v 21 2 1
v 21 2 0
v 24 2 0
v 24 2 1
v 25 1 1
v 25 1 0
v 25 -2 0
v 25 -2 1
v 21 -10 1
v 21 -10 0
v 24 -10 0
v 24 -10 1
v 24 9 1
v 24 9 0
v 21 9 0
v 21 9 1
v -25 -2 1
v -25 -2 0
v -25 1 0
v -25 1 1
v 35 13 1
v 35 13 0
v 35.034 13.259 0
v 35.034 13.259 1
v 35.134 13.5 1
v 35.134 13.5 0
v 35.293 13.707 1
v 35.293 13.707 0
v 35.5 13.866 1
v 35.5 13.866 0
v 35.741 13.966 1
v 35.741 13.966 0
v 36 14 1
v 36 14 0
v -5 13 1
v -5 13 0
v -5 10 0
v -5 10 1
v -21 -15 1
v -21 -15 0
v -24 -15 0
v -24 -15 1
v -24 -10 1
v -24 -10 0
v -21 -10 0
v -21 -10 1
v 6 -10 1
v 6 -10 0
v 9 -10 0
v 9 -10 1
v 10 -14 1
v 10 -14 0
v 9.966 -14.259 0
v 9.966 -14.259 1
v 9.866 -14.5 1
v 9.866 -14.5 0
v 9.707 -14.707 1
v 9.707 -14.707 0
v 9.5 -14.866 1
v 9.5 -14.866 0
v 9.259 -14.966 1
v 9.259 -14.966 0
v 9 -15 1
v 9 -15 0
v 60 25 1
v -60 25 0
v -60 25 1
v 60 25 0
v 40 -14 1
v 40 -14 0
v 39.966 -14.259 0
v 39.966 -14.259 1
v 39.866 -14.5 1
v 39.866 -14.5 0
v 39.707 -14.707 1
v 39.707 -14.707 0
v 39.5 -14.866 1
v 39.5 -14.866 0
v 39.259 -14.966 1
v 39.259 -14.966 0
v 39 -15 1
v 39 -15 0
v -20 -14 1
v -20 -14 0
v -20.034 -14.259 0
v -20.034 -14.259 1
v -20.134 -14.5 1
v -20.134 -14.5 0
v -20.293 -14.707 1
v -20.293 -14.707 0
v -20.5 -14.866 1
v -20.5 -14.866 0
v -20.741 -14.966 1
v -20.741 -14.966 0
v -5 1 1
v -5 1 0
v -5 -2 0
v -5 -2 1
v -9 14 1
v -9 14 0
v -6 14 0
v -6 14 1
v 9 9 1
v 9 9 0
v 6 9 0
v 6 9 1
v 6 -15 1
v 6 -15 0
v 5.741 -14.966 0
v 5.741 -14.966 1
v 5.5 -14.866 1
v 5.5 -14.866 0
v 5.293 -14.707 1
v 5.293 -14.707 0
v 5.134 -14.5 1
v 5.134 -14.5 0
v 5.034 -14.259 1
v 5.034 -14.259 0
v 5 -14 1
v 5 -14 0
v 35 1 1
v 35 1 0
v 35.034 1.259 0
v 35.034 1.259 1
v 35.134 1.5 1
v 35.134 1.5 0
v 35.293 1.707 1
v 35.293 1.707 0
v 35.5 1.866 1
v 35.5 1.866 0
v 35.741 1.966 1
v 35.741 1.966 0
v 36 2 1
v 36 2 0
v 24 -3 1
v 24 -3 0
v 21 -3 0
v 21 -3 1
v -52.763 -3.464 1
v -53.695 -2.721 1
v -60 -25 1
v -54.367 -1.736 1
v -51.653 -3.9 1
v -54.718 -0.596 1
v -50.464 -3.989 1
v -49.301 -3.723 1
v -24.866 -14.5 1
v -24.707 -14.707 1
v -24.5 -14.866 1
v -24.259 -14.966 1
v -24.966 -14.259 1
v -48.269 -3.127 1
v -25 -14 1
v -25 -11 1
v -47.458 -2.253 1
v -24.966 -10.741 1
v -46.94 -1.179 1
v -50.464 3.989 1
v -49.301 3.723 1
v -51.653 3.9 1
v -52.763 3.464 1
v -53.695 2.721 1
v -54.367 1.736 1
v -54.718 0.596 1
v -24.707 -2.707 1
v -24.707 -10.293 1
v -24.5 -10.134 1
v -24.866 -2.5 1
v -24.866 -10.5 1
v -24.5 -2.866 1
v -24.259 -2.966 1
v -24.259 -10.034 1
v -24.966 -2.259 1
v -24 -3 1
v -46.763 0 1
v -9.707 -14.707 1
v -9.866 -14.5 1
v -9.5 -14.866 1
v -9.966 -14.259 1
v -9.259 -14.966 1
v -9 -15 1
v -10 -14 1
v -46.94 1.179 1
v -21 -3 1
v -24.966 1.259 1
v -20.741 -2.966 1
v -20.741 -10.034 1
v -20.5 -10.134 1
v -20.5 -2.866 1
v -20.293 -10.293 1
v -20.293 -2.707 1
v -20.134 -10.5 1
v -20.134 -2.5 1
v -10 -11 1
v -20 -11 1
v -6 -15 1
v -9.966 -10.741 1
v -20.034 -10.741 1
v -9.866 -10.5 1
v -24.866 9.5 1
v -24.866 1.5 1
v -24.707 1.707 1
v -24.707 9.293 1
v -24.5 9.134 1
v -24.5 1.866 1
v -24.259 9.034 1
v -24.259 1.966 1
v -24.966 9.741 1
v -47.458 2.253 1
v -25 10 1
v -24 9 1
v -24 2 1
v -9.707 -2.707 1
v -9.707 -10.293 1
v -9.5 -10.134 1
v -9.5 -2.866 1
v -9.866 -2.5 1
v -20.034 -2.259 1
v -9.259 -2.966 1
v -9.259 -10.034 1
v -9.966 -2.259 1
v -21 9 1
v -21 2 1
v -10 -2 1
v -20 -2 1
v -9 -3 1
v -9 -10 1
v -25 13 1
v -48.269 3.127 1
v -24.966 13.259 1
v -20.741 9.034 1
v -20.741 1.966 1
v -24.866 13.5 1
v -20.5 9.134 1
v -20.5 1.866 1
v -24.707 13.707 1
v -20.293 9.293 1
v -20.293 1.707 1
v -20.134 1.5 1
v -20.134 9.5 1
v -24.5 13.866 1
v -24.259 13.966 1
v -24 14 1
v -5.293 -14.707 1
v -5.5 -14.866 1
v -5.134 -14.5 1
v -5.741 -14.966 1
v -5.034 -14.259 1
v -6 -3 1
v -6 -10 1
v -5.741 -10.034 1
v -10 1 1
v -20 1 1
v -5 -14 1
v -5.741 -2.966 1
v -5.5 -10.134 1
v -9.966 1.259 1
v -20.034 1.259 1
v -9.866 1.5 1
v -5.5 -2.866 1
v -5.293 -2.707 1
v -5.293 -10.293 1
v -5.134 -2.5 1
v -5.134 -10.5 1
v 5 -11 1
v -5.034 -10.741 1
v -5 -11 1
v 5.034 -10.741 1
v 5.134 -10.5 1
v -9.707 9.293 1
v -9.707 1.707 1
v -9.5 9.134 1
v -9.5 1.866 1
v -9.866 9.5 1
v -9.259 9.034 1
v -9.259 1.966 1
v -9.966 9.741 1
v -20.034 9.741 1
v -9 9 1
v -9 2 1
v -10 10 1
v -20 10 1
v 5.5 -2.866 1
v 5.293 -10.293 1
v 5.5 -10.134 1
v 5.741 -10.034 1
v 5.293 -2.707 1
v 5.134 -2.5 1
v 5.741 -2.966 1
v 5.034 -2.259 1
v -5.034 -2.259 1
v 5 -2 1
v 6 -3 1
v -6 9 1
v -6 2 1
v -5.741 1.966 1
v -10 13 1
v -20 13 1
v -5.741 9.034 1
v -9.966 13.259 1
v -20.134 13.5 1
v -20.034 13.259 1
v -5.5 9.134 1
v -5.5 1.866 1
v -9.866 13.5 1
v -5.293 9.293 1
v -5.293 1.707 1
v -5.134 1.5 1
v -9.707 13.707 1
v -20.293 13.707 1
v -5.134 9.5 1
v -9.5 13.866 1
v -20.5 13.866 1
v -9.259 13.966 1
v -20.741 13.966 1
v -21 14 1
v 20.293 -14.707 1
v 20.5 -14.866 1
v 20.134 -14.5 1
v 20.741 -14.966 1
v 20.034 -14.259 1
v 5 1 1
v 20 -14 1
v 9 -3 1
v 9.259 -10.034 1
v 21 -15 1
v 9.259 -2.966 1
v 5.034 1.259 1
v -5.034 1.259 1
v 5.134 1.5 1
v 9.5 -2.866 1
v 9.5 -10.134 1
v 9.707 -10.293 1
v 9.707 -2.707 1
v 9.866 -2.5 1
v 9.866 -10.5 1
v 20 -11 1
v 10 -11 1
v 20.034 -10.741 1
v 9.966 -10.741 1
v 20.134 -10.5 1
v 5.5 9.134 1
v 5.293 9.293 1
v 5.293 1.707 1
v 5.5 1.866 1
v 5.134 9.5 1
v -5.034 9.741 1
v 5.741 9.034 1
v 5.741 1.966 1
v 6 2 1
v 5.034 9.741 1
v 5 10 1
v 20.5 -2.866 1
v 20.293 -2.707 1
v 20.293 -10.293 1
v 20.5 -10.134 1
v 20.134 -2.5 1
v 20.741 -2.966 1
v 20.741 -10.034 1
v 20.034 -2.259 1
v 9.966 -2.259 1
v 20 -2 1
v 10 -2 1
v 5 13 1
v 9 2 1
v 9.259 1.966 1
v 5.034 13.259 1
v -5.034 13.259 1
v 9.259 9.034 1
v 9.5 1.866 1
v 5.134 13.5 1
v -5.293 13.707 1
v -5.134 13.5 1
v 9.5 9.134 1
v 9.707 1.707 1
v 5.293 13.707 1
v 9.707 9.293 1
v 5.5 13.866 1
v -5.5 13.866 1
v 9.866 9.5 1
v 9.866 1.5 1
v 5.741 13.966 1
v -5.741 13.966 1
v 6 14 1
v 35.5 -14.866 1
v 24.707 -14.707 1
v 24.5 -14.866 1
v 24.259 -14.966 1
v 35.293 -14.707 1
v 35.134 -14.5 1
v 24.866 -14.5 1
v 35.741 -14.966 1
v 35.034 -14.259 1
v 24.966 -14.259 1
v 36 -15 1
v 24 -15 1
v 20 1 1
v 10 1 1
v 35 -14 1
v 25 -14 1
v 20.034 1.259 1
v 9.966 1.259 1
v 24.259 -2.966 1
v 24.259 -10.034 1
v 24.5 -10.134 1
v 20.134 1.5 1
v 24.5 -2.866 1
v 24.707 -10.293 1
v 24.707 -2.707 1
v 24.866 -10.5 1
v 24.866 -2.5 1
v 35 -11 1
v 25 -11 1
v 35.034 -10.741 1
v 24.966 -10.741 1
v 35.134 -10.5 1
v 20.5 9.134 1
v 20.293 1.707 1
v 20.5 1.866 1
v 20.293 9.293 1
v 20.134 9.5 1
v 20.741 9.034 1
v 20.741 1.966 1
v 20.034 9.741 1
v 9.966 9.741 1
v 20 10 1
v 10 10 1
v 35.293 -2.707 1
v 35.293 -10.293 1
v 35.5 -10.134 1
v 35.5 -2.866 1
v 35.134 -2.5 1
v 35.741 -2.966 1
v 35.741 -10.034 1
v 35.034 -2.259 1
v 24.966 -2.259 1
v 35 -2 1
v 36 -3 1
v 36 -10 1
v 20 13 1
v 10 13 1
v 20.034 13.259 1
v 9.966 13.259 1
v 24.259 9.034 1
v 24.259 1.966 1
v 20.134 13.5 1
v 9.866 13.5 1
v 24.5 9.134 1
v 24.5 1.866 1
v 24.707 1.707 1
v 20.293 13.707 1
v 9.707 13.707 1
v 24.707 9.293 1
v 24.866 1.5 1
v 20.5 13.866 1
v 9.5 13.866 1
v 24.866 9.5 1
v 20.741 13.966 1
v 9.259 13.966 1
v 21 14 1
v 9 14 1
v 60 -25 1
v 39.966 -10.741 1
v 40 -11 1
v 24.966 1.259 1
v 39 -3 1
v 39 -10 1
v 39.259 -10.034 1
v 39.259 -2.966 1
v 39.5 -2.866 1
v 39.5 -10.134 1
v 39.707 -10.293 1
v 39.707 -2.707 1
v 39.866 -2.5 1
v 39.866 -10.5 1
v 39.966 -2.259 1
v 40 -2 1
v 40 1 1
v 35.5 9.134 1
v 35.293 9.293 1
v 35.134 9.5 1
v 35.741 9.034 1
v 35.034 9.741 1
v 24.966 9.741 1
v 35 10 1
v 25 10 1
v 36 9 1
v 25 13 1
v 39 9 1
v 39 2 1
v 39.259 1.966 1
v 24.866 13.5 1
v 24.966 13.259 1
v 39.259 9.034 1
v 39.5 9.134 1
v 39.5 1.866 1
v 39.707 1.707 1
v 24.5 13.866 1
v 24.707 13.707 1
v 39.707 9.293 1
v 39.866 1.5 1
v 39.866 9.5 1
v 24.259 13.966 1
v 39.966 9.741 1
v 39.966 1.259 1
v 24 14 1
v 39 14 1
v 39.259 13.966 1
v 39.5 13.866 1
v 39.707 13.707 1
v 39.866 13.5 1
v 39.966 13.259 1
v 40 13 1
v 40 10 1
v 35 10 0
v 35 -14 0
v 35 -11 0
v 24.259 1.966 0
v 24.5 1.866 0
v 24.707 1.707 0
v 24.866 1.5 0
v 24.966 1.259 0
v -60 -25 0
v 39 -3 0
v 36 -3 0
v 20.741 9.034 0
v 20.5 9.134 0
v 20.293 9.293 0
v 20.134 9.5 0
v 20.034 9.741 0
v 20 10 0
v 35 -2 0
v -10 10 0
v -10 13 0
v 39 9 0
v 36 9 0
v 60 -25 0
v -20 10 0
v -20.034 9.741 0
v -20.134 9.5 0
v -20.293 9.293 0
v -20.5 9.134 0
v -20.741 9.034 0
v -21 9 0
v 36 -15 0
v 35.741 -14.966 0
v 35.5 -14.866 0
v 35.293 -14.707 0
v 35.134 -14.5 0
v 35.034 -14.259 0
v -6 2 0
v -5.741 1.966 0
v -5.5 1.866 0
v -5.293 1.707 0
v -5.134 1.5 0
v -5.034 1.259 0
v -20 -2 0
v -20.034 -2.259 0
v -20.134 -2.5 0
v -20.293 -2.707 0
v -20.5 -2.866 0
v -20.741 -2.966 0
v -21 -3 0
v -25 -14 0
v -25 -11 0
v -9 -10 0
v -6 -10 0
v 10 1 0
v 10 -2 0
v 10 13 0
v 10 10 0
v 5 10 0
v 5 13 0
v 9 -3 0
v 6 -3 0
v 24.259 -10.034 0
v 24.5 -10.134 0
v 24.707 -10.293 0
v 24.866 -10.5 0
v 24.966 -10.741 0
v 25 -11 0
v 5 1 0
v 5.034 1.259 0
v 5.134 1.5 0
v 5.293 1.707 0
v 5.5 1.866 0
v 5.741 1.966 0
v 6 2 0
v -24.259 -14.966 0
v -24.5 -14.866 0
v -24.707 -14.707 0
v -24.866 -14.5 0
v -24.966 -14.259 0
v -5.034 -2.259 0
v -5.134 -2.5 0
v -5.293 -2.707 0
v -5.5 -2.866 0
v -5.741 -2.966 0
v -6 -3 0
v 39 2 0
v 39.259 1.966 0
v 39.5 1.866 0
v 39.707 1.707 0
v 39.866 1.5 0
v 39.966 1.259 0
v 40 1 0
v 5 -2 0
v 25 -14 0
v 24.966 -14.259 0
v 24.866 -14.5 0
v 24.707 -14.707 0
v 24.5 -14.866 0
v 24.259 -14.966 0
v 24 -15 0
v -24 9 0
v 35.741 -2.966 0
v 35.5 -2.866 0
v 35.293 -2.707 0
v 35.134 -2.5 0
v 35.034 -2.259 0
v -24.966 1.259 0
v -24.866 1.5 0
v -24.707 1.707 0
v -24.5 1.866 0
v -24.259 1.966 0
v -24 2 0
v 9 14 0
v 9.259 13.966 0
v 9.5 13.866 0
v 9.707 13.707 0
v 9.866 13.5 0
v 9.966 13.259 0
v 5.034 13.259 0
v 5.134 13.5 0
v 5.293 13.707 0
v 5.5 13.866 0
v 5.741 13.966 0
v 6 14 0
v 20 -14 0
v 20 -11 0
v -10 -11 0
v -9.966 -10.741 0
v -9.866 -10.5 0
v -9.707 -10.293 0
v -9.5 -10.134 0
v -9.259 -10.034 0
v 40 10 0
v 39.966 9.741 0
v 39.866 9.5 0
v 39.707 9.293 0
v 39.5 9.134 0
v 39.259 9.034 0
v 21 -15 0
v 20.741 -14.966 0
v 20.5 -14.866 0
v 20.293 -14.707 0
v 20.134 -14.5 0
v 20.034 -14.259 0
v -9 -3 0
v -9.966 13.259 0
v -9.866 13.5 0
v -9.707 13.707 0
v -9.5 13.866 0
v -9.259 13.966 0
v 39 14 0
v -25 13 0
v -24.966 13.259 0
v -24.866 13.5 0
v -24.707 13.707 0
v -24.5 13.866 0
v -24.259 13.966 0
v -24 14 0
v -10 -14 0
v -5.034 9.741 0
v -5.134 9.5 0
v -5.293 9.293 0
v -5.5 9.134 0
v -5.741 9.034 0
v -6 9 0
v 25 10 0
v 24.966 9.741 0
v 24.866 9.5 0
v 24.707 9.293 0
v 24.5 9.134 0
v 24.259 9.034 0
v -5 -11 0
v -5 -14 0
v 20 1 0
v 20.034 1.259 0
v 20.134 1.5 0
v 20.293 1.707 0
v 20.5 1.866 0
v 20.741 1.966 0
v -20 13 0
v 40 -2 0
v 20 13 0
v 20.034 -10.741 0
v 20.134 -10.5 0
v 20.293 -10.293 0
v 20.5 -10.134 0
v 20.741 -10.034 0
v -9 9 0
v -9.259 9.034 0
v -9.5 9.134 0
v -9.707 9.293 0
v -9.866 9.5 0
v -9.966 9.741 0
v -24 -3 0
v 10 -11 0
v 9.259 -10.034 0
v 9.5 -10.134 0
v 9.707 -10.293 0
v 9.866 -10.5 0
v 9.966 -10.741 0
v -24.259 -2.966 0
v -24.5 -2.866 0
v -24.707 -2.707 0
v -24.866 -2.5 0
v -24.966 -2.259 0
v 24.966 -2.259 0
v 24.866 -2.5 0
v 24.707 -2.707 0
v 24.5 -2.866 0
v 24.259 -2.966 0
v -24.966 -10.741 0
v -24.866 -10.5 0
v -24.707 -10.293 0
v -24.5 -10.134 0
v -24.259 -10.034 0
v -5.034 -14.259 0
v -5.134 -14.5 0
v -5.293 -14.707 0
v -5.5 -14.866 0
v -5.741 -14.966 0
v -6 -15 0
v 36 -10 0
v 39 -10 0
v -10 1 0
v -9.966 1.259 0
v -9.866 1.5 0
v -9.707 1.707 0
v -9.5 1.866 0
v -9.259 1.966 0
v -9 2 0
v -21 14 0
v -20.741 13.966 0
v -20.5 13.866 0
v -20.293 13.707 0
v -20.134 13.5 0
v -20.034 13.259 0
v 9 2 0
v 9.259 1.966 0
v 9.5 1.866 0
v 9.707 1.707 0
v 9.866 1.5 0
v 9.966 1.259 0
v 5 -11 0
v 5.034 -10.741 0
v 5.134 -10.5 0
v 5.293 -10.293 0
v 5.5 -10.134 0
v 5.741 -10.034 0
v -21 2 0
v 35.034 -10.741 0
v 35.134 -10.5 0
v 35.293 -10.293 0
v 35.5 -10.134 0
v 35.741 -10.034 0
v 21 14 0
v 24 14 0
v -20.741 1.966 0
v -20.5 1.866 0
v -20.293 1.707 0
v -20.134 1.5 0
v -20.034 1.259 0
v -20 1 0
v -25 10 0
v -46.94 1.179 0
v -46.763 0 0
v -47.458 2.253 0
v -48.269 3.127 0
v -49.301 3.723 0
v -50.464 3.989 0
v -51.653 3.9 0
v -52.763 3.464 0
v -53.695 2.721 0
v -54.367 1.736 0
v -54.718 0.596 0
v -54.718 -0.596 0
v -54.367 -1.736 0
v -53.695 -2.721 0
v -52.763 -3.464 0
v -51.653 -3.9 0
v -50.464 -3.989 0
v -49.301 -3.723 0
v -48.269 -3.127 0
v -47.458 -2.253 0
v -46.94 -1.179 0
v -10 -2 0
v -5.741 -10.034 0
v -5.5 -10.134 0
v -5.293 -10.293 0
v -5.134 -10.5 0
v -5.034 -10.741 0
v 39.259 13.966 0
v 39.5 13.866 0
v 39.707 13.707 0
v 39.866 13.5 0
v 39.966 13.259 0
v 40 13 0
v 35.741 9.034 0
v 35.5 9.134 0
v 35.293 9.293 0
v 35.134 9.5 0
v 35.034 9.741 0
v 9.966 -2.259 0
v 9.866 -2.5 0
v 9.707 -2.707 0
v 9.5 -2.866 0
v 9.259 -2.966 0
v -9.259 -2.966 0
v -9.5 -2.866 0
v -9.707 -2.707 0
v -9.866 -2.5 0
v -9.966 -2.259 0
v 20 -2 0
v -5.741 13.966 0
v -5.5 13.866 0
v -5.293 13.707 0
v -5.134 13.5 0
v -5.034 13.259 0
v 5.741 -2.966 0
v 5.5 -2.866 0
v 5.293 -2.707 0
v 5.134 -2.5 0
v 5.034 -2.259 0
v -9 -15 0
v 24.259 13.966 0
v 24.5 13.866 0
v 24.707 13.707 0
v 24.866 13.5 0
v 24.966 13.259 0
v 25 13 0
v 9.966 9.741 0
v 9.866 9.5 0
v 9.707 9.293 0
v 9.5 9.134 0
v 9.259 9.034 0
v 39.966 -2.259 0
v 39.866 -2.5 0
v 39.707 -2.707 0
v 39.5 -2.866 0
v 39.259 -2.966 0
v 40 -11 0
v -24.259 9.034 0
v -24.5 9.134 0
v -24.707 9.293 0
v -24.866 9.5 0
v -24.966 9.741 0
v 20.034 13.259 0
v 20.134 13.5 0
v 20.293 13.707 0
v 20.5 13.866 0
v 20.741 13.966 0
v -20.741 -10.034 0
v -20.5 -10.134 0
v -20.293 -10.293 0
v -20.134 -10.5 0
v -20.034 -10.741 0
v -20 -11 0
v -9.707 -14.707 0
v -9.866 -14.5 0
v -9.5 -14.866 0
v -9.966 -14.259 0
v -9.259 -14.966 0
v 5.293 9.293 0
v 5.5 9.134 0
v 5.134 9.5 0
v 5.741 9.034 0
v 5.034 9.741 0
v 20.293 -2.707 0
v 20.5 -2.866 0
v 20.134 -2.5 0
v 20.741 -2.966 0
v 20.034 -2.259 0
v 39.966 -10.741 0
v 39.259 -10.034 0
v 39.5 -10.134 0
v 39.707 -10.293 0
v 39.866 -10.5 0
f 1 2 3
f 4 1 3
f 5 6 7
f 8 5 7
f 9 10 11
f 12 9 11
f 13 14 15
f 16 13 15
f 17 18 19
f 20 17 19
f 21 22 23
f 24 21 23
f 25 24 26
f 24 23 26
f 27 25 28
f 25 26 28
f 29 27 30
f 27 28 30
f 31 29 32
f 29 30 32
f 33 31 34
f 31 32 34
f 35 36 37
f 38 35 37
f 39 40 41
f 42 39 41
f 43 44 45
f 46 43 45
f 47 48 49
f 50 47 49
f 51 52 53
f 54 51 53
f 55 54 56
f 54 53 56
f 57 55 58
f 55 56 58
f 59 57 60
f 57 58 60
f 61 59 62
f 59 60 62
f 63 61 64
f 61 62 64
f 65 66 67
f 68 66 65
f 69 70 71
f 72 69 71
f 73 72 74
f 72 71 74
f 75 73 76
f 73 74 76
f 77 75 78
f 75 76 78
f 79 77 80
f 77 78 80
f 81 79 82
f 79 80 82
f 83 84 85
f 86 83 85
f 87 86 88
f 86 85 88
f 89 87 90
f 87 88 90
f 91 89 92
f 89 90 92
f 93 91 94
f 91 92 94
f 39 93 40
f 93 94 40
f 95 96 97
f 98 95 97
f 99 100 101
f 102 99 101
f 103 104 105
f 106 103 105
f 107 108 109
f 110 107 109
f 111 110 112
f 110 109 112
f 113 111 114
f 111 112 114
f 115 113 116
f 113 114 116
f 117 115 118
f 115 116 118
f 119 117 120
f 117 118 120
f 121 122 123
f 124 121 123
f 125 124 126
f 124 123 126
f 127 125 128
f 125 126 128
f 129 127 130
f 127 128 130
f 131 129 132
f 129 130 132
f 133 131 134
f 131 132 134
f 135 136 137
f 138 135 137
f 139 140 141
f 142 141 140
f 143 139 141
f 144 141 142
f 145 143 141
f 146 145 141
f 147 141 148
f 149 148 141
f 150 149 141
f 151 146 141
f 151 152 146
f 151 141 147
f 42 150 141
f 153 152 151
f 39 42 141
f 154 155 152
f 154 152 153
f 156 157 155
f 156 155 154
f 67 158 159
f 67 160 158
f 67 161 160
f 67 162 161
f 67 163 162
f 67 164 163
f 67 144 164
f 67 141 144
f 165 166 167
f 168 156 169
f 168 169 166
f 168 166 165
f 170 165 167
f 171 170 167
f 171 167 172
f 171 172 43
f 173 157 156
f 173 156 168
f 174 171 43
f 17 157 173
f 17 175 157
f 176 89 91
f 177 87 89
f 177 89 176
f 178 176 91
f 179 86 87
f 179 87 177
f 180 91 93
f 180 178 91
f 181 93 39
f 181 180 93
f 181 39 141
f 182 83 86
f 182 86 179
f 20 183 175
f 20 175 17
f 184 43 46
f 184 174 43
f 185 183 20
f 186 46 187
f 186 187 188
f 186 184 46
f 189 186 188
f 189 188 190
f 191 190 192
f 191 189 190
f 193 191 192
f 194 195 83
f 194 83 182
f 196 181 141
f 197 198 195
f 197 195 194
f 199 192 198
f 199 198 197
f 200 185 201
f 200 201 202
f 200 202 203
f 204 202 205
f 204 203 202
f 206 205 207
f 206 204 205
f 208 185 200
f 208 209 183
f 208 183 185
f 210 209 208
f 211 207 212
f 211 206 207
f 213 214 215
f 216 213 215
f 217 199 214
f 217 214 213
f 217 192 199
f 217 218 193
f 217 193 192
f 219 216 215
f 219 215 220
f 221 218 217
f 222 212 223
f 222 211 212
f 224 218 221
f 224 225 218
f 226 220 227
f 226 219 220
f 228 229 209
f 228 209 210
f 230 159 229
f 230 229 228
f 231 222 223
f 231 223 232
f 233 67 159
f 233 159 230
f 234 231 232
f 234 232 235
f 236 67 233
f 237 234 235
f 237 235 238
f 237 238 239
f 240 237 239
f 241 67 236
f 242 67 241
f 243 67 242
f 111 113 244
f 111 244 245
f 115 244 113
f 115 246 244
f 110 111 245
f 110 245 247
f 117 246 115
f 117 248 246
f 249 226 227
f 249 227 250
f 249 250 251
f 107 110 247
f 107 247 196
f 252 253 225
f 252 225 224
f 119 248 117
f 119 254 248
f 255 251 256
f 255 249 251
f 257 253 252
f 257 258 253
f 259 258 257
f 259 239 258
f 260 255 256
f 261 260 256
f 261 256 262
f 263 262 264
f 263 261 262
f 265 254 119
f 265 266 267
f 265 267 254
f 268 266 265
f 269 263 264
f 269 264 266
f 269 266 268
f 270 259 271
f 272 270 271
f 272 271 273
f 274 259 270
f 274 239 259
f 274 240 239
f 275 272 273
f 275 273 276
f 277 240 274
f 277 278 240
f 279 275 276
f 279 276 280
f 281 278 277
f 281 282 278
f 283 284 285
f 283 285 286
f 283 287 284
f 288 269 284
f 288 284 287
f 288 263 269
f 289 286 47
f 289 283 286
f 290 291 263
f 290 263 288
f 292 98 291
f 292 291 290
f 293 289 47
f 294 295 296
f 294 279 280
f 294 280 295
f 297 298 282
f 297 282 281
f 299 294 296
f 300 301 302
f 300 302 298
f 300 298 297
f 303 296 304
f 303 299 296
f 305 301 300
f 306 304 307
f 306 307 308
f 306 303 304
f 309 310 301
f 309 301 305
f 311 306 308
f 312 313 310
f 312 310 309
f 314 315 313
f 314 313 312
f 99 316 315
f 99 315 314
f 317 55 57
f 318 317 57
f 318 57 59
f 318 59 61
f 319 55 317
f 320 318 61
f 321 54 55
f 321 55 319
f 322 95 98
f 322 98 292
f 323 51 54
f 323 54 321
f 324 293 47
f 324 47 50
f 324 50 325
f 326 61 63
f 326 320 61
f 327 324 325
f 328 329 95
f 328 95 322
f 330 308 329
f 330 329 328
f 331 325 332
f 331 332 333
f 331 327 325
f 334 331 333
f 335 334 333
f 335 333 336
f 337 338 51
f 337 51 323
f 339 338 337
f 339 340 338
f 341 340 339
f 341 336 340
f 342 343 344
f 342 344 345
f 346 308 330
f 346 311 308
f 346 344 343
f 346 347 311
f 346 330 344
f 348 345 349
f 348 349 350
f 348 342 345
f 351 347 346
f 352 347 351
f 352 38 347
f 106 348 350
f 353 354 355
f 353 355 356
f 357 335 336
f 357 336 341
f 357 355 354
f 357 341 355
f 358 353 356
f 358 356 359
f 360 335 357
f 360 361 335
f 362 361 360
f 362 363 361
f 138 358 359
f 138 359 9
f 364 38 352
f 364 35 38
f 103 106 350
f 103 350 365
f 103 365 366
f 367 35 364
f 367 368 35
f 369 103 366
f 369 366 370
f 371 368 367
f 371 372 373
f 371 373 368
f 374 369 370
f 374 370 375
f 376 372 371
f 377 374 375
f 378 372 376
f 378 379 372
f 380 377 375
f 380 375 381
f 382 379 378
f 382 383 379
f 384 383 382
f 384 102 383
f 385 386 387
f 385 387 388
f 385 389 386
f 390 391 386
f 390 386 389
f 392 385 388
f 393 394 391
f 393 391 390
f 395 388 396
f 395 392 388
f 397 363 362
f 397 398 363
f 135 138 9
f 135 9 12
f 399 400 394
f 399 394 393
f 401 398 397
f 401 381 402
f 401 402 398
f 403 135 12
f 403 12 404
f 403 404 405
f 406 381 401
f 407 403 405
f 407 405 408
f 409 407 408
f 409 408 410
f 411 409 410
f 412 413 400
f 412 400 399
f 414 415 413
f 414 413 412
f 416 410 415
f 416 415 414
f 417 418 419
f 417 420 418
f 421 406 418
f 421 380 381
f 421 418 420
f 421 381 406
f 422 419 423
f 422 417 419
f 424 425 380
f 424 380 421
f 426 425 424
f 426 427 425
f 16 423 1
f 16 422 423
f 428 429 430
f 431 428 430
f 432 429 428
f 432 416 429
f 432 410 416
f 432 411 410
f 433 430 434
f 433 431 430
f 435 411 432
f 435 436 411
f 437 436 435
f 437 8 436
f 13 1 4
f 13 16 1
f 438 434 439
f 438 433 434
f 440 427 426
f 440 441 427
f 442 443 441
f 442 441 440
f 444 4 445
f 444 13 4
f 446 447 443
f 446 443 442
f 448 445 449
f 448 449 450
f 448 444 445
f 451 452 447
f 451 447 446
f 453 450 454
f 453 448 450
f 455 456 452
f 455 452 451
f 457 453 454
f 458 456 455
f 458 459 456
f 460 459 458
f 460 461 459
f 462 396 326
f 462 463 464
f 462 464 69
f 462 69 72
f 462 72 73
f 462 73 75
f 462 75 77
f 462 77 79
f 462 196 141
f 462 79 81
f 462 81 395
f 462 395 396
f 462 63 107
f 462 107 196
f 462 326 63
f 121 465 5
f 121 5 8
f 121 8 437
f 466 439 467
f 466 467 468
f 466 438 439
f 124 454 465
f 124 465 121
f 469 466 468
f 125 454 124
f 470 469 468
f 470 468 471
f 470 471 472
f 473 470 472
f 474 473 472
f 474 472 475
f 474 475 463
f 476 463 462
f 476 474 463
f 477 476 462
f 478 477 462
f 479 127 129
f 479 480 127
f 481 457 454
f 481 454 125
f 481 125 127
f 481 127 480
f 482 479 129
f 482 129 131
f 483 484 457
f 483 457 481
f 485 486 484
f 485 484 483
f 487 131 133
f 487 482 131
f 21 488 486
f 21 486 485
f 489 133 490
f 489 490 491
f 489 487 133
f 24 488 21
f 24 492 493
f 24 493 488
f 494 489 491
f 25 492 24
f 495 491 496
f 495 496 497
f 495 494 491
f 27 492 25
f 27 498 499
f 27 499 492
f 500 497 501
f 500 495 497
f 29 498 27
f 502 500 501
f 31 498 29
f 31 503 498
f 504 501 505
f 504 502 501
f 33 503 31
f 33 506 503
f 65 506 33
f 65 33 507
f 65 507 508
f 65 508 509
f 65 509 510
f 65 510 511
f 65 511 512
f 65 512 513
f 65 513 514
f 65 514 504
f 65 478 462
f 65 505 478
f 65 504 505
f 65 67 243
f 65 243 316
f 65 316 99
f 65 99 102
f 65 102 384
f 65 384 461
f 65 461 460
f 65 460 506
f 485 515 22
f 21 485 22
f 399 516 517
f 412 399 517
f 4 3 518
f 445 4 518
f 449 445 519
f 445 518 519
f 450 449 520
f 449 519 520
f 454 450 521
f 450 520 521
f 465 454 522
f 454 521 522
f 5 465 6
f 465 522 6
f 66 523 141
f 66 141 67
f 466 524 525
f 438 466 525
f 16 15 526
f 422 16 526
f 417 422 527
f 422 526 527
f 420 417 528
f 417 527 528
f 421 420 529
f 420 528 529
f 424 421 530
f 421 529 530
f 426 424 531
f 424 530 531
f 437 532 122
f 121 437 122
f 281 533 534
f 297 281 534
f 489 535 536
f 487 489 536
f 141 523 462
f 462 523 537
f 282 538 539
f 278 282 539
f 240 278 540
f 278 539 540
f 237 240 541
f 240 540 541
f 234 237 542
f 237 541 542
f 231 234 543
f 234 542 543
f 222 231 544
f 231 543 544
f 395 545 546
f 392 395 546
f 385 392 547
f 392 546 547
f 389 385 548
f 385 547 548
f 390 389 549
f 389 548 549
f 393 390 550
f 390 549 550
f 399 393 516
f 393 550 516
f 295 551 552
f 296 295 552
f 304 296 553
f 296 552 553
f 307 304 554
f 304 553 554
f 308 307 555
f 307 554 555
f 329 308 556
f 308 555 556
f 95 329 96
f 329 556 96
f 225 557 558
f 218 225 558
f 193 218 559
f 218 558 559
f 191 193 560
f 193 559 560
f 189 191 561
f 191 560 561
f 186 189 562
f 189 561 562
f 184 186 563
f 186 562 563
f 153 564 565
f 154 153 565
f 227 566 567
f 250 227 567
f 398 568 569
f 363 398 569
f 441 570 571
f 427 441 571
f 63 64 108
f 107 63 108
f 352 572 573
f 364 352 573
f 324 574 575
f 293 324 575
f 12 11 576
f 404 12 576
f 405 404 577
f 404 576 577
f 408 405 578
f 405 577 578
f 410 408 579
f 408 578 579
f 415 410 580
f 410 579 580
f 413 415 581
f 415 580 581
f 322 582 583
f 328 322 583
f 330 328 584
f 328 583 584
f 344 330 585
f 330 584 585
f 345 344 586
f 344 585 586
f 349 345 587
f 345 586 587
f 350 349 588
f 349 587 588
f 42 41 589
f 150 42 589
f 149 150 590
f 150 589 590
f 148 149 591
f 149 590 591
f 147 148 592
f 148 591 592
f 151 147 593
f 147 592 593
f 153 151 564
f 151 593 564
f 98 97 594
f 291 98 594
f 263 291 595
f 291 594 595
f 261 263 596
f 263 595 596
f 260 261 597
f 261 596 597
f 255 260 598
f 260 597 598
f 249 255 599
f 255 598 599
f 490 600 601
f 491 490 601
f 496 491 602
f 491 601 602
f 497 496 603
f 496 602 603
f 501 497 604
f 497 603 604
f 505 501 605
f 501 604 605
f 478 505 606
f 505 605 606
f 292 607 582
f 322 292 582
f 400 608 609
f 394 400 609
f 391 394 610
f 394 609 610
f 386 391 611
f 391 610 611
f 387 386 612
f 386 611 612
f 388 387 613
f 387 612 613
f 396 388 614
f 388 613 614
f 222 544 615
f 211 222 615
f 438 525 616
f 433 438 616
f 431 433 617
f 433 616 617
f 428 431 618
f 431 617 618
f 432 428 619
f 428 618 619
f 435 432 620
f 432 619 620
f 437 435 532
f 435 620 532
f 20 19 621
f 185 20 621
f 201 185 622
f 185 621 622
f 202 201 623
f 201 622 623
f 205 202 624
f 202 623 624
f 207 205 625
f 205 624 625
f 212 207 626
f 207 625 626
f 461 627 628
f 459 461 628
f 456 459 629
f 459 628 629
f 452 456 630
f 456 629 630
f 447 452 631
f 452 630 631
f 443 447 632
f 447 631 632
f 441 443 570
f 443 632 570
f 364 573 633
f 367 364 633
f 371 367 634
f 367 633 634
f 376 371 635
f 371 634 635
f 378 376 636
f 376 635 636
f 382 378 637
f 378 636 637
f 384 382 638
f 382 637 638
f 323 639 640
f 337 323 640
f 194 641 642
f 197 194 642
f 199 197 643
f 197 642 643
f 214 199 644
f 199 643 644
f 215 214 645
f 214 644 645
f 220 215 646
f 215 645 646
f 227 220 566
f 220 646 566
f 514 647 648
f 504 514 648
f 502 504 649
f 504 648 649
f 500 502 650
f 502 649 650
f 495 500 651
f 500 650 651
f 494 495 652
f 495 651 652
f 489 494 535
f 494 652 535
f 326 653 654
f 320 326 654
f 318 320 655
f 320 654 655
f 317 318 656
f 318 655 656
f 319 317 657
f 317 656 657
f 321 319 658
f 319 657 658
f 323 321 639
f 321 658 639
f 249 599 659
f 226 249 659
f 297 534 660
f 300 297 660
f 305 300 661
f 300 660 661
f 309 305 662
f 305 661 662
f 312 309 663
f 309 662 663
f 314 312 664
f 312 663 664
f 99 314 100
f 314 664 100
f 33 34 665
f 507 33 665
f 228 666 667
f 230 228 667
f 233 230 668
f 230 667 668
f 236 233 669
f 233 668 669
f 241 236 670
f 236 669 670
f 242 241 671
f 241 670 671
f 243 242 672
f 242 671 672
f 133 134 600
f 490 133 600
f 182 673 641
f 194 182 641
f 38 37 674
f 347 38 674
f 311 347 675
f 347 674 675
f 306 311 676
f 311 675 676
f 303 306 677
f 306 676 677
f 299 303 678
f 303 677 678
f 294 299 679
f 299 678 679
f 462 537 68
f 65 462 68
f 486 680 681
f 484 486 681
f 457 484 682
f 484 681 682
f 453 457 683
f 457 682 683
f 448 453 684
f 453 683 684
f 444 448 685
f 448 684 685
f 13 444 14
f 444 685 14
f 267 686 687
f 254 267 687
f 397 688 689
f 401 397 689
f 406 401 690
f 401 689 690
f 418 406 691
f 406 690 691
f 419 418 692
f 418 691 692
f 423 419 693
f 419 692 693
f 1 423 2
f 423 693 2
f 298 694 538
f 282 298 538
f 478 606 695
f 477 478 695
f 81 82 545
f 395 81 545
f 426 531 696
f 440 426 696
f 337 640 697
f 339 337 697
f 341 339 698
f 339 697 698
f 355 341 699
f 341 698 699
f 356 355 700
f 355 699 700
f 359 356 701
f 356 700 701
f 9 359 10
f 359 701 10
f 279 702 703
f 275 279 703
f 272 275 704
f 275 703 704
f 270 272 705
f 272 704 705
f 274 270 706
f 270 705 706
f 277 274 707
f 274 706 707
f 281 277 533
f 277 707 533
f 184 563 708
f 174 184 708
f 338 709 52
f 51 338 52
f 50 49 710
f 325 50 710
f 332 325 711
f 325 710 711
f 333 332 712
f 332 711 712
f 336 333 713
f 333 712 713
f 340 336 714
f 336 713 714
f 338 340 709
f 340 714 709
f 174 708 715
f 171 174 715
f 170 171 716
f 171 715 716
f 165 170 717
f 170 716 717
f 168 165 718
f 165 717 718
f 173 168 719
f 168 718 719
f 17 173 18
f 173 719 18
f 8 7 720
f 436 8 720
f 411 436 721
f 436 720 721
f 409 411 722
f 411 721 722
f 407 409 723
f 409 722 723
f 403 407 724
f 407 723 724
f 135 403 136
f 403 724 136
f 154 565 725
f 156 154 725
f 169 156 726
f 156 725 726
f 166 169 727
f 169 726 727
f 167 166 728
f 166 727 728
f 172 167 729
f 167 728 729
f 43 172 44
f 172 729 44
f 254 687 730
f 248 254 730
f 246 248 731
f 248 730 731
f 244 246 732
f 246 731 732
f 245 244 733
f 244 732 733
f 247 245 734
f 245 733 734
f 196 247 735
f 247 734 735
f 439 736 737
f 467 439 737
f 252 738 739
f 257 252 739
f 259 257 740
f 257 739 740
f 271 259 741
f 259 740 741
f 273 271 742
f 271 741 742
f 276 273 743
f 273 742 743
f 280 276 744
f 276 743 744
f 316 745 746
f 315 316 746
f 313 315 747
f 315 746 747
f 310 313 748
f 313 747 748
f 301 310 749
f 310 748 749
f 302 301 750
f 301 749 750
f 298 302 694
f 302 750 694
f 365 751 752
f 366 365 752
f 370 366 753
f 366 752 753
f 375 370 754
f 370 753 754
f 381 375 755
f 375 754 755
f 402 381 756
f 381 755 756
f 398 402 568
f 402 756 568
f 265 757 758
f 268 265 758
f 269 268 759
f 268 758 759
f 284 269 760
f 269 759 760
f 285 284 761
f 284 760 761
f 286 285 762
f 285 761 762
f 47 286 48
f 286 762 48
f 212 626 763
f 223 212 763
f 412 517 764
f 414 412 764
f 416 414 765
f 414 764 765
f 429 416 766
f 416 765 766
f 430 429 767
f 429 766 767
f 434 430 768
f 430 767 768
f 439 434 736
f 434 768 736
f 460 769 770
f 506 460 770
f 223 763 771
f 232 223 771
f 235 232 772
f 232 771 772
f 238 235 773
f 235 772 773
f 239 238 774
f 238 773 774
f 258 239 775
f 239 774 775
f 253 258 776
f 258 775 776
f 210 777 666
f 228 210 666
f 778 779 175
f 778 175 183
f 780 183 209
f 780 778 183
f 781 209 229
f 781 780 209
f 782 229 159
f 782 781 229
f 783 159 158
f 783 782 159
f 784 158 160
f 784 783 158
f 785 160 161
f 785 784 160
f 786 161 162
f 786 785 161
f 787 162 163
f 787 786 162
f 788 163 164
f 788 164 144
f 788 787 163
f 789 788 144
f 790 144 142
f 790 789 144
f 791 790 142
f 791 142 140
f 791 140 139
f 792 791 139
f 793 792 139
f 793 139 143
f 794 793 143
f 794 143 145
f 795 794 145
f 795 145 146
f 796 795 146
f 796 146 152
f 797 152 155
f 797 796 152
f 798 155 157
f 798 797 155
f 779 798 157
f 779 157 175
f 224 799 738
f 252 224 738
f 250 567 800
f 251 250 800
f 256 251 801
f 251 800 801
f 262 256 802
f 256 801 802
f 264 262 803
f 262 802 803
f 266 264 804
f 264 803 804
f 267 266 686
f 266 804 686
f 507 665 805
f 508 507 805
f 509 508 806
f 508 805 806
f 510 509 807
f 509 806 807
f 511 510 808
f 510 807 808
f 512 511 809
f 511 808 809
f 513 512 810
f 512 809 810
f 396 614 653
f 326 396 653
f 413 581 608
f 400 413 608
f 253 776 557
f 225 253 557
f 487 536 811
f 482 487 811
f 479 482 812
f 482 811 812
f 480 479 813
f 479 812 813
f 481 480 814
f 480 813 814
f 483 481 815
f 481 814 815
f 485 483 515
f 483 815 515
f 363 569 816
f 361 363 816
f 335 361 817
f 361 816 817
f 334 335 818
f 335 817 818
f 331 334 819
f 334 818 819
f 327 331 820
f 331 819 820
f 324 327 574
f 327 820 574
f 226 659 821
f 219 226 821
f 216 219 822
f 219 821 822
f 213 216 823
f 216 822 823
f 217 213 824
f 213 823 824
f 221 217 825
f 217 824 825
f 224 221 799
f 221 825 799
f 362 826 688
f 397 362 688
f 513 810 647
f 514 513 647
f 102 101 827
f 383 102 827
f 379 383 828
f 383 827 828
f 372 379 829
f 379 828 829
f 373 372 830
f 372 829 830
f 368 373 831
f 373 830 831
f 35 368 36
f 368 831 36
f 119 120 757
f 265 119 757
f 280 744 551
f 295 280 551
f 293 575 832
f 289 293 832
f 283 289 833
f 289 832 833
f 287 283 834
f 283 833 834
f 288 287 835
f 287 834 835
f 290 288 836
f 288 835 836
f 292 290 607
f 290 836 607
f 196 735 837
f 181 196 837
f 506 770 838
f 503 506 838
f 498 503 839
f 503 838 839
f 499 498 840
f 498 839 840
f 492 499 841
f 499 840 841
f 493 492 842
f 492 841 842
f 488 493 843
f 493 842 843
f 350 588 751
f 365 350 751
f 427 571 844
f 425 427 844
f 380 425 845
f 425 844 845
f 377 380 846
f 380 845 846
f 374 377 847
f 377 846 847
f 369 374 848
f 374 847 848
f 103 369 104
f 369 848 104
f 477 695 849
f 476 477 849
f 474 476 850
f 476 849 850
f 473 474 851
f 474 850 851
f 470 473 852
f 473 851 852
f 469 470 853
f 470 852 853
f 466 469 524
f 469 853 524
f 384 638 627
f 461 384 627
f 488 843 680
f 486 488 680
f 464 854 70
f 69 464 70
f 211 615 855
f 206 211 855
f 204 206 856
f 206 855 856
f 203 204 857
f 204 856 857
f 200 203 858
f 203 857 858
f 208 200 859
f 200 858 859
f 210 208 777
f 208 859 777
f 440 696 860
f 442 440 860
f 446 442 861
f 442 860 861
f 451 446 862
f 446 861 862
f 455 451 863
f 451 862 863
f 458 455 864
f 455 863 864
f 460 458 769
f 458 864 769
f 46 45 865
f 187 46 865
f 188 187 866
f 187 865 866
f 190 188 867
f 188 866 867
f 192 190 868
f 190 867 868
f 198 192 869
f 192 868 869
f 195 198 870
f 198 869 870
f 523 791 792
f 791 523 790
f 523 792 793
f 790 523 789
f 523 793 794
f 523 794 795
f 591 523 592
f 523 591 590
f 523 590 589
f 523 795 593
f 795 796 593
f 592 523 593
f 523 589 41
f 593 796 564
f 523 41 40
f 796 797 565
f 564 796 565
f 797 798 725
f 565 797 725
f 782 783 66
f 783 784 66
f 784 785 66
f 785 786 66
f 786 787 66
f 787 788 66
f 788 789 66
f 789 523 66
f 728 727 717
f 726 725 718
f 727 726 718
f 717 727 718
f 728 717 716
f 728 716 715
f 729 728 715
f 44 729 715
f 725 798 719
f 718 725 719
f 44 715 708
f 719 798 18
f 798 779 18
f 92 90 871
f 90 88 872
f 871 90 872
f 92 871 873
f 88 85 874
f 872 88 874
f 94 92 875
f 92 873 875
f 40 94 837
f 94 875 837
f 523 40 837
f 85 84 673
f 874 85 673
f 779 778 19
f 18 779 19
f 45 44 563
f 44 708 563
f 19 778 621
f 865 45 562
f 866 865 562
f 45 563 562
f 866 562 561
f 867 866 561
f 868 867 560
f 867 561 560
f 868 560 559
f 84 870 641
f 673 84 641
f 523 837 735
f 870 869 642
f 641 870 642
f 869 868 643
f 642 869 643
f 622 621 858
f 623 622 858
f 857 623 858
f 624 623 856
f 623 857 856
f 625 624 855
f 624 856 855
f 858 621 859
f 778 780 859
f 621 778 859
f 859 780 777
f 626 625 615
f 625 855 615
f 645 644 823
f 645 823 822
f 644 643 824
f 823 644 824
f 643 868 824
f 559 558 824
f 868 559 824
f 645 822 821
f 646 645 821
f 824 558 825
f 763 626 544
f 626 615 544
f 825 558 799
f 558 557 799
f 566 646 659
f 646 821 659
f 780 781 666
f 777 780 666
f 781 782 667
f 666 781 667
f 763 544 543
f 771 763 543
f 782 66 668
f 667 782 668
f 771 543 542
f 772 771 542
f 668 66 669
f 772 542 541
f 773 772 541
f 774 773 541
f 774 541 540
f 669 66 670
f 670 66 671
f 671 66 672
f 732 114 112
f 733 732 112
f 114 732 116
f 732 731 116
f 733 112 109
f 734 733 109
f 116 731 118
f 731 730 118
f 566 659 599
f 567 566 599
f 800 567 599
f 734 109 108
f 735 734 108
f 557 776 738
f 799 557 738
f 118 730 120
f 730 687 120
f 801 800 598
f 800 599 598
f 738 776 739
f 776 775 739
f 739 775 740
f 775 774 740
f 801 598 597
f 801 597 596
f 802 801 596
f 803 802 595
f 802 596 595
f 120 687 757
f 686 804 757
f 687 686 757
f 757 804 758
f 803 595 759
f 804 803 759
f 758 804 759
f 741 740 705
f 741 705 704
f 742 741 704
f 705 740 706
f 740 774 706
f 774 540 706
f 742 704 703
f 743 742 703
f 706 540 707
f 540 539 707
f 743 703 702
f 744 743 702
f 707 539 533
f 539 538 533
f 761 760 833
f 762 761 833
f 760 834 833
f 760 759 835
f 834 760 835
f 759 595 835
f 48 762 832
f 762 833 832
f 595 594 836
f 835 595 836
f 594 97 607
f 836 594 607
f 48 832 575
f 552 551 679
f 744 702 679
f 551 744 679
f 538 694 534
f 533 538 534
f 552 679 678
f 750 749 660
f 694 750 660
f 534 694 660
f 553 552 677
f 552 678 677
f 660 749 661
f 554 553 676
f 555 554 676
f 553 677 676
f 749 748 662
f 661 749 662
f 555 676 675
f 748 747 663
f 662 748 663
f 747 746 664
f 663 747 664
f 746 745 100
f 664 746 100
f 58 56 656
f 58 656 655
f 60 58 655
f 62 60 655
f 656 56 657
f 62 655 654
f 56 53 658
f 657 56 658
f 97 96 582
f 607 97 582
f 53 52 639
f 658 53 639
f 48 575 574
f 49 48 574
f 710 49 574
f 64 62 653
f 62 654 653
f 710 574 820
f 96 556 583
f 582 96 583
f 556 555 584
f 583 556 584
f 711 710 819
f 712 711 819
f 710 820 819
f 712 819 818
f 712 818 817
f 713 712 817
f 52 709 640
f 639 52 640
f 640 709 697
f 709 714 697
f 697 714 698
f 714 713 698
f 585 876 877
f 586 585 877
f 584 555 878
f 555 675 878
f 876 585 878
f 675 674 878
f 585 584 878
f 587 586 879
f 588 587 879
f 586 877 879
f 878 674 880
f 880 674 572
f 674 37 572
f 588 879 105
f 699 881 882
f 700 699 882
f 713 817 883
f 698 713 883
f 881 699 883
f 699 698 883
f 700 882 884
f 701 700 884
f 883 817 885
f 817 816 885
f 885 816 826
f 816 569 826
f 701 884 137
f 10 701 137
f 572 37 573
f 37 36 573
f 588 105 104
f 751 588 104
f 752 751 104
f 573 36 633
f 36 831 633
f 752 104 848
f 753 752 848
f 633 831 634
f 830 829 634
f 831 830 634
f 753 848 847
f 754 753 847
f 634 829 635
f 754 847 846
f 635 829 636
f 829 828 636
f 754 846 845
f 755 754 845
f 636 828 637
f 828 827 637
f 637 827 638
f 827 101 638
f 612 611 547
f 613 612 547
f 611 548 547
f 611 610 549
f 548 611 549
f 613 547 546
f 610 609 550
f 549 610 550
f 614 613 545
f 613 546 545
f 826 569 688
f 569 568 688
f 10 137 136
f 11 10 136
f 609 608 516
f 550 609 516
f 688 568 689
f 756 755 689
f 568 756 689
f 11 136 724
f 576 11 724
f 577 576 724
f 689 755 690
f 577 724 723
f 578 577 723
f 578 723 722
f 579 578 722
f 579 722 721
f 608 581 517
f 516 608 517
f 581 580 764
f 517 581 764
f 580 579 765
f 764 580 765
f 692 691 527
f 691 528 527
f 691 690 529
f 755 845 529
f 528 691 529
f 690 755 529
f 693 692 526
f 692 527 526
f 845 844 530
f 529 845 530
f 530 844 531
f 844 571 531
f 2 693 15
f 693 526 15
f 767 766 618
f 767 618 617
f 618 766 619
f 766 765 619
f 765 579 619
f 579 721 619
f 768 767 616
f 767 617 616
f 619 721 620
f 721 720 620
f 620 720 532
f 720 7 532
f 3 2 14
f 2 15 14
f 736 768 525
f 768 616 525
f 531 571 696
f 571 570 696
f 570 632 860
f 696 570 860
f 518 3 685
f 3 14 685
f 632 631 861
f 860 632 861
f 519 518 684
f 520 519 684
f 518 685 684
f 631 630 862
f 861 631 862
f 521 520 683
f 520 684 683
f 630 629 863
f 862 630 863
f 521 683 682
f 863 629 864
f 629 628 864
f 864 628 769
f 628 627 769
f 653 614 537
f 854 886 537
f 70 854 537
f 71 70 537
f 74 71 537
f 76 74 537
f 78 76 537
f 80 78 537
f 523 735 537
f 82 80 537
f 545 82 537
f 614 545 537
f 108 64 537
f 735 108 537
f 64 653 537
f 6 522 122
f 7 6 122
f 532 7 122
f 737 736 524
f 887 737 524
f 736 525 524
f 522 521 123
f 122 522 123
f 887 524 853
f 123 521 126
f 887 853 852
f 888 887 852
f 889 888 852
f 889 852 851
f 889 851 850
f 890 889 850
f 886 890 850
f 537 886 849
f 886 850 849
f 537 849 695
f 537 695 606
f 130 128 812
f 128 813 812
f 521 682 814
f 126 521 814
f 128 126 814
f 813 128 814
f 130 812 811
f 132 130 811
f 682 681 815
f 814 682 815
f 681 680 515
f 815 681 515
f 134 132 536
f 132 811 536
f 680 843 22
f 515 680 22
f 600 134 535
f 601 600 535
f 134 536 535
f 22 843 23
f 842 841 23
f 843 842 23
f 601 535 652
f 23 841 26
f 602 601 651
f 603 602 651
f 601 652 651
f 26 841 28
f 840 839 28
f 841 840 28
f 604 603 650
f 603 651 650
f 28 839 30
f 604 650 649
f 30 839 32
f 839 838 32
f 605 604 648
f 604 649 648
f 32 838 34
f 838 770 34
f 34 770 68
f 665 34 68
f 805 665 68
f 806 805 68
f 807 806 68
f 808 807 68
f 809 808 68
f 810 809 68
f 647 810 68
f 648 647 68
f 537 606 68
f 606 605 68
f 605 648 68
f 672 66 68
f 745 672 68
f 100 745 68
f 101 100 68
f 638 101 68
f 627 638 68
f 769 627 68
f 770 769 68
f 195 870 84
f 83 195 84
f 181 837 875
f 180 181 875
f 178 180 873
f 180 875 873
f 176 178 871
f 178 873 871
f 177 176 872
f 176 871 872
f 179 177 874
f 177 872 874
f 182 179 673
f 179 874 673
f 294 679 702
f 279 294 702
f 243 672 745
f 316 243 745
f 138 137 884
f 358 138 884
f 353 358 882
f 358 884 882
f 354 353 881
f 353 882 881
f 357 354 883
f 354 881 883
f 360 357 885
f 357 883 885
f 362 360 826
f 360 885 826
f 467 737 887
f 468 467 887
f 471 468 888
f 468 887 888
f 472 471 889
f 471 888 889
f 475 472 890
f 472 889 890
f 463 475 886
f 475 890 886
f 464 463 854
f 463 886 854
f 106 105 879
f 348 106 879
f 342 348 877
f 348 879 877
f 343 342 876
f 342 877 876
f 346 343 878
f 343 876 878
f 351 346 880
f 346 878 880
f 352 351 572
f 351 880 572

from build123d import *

# Parameters (mm, degrees)
F0_W     = 120
F0_H     = 50
F0_R     = 4
F1_DEPTH = 1


with BuildPart() as f1:
    # F0 (on Top) → F1 (new body)
    with BuildSketch(Plane.XY):
        Rectangle(F0_W, F0_H)
        with BuildLine():
            Line((-21, -15), (-24, -15))
            ThreePointArc((-24, -15), (-24.707107, -14.707107), (-25, -14))
            Line((-25, -14), (-25, -11))
            ThreePointArc((-25, -11), (-24.707107, -10.292893), (-24, -10))
            Line((-24, -10), (-21, -10))
            ThreePointArc((-21, -10), (-20.292893, -10.292893), (-20, -11))
            Line((-20, -11), (-20, -14))
            ThreePointArc((-20, -14), (-20.292893, -14.707107), (-21, -15))
        make_face(mode=Mode.SUBTRACT)
        with BuildLine():
            ThreePointArc((-10, -11), (-9.707107, -10.292893), (-9, -10))
            Line((-9, -10), (-6, -10))
            ThreePointArc((-6, -10), (-5.292893, -10.292893), (-5, -11))
            Line((-5, -11), (-5, -14))
            ThreePointArc((-5, -14), (-5.292893, -14.707107), (-6, -15))
            Line((-6, -15), (-9, -15))
            ThreePointArc((-9, -15), (-9.707107, -14.707107), (-10, -14))
            Line((-10, -14), (-10, -11))
        make_face(mode=Mode.SUBTRACT)
        with BuildLine():
            ThreePointArc((-25, 1), (-24.707107, 1.707107), (-24, 2))
            Line((-24, 2), (-21, 2))
            ThreePointArc((-21, 2), (-20.292893, 1.707107), (-20, 1))
            Line((-20, 1), (-20, -2))
            ThreePointArc((-20, -2), (-20.292893, -2.707107), (-21, -3))
            Line((-21, -3), (-24, -3))
            ThreePointArc((-24, -3), (-24.707107, -2.707107), (-25, -2))
            Line((-25, -2), (-25, 1))
        make_face(mode=Mode.SUBTRACT)
        with BuildLine():
            ThreePointArc((-10, 1), (-9.707107, 1.707107), (-9, 2))
            Line((-9, 2), (-6, 2))
            ThreePointArc((-6, 2), (-5.292893, 1.707107), (-5, 1))
            Line((-5, 1), (-5, -2))
            ThreePointArc((-5, -2), (-5.292893, -2.707107), (-6, -3))
            Line((-6, -3), (-9, -3))
            ThreePointArc((-9, -3), (-9.707107, -2.707107), (-10, -2))
            Line((-10, -2), (-10, 1))
        make_face(mode=Mode.SUBTRACT)
        with BuildLine():
            ThreePointArc((5, -11), (5.292893, -10.292893), (6, -10))
            Line((6, -10), (9, -10))
            ThreePointArc((9, -10), (9.707107, -10.292893), (10, -11))
            Line((10, -11), (10, -14))
            ThreePointArc((10, -14), (9.707107, -14.707107), (9, -15))
            Line((9, -15), (6, -15))
            ThreePointArc((6, -15), (5.292893, -14.707107), (5, -14))
            Line((5, -14), (5, -11))
        make_face(mode=Mode.SUBTRACT)
        with BuildLine():
            ThreePointArc((20, -11), (20.292893, -10.292893), (21, -10))
            Line((21, -10), (24, -10))
            ThreePointArc((24, -10), (24.707107, -10.292893), (25, -11))
            Line((25, -11), (25, -14))
            ThreePointArc((25, -14), (24.707107, -14.707107), (24, -15))
            Line((24, -15), (21, -15))
            ThreePointArc((21, -15), (20.292893, -14.707107), (20, -14))
            Line((20, -14), (20, -11))
        make_face(mode=Mode.SUBTRACT)
        with BuildLine():
            ThreePointArc((5, 1), (5.292893, 1.707107), (6, 2))
            Line((6, 2), (9, 2))
            ThreePointArc((9, 2), (9.707107, 1.707107), (10, 1))
            Line((10, 1), (10, -2))
            ThreePointArc((10, -2), (9.707107, -2.707107), (9, -3))
            Line((9, -3), (6, -3))
            ThreePointArc((6, -3), (5.292893, -2.707107), (5, -2))
            Line((5, -2), (5, 1))
        make_face(mode=Mode.SUBTRACT)
        with BuildLine():
            ThreePointArc((20, 1), (20.292893, 1.707107), (21, 2))
            Line((21, 2), (24, 2))
            ThreePointArc((24, 2), (24.707107, 1.707107), (25, 1))
            Line((25, 1), (25, -2))
            ThreePointArc((25, -2), (24.707107, -2.707107), (24, -3))
            Line((24, -3), (21, -3))
            ThreePointArc((21, -3), (20.292893, -2.707107), (20, -2))
            Line((20, -2), (20, 1))
        make_face(mode=Mode.SUBTRACT)
        with BuildLine():
            ThreePointArc((35, -11), (35.292893, -10.292893), (36, -10))
            Line((36, -10), (39, -10))
            ThreePointArc((39, -10), (39.707107, -10.292893), (40, -11))
            Line((40, -11), (40, -14))
            ThreePointArc((40, -14), (39.707107, -14.707107), (39, -15))
            Line((39, -15), (36, -15))
            ThreePointArc((36, -15), (35.292893, -14.707107), (35, -14))
            Line((35, -14), (35, -11))
        make_face(mode=Mode.SUBTRACT)
        with BuildLine():
            ThreePointArc((35, 1), (35.292893, 1.707107), (36, 2))
            Line((36, 2), (39, 2))
            ThreePointArc((39, 2), (39.707107, 1.707107), (40, 1))
            Line((40, 1), (40, -2))
            ThreePointArc((40, -2), (39.707107, -2.707107), (39, -3))
            Line((39, -3), (36, -3))
            ThreePointArc((36, -3), (35.292893, -2.707107), (35, -2))
            Line((35, -2), (35, 1))
        make_face(mode=Mode.SUBTRACT)
        with Locations((-50.762694, 0)):
            Circle(F0_R, mode=Mode.SUBTRACT)
        with BuildLine():
            ThreePointArc((-25, 13), (-24.707107, 13.707107), (-24, 14))
            Line((-24, 14), (-21, 14))
            ThreePointArc((-21, 14), (-20.292893, 13.707107), (-20, 13))
            Line((-20, 13), (-20, 10))
            ThreePointArc((-20, 10), (-20.292893, 9.292893), (-21, 9))
            Line((-21, 9), (-24, 9))
            ThreePointArc((-24, 9), (-24.707107, 9.292893), (-25, 10))
            Line((-25, 10), (-25, 13))
        make_face(mode=Mode.SUBTRACT)
        with BuildLine():
            ThreePointArc((-10, 13), (-9.707107, 13.707107), (-9, 14))
            Line((-9, 14), (-6, 14))
            ThreePointArc((-6, 14), (-5.292893, 13.707107), (-5, 13))
            Line((-5, 13), (-5, 10))
            ThreePointArc((-5, 10), (-5.292893, 9.292893), (-6, 9))
            Line((-6, 9), (-9, 9))
            ThreePointArc((-9, 9), (-9.707107, 9.292893), (-10, 10))
            Line((-10, 10), (-10, 13))
        make_face(mode=Mode.SUBTRACT)
        with BuildLine():
            ThreePointArc((5, 13), (5.292893, 13.707107), (6, 14))
            Line((6, 14), (9, 14))
            ThreePointArc((9, 14), (9.707107, 13.707107), (10, 13))
            Line((10, 13), (10, 10))
            ThreePointArc((10, 10), (9.707107, 9.292893), (9, 9))
            Line((9, 9), (6, 9))
            ThreePointArc((6, 9), (5.292893, 9.292893), (5, 10))
            Line((5, 10), (5, 13))
        make_face(mode=Mode.SUBTRACT)
        with BuildLine():
            ThreePointArc((20, 13), (20.292893, 13.707107), (21, 14))
            Line((21, 14), (24, 14))
            ThreePointArc((24, 14), (24.707107, 13.707107), (25, 13))
            Line((25, 13), (25, 10))
            ThreePointArc((25, 10), (24.707107, 9.292893), (24, 9))
            Line((24, 9), (21, 9))
            ThreePointArc((21, 9), (20.292893, 9.292893), (20, 10))
            Line((20, 10), (20, 13))
        make_face(mode=Mode.SUBTRACT)
        with BuildLine():
            ThreePointArc((35, 13), (35.292893, 13.707107), (36, 14))
            Line((36, 14), (39, 14))
            ThreePointArc((39, 14), (39.707107, 13.707107), (40, 13))
            Line((40, 13), (40, 10))
            ThreePointArc((40, 10), (39.707107, 9.292893), (39, 9))
            Line((39, 9), (36, 9))
            ThreePointArc((36, 9), (35.292893, 9.292893), (35, 10))
            Line((35, 10), (35, 13))
        make_face(mode=Mode.SUBTRACT)
    extrude(amount=F1_DEPTH)


solid = f1.part
